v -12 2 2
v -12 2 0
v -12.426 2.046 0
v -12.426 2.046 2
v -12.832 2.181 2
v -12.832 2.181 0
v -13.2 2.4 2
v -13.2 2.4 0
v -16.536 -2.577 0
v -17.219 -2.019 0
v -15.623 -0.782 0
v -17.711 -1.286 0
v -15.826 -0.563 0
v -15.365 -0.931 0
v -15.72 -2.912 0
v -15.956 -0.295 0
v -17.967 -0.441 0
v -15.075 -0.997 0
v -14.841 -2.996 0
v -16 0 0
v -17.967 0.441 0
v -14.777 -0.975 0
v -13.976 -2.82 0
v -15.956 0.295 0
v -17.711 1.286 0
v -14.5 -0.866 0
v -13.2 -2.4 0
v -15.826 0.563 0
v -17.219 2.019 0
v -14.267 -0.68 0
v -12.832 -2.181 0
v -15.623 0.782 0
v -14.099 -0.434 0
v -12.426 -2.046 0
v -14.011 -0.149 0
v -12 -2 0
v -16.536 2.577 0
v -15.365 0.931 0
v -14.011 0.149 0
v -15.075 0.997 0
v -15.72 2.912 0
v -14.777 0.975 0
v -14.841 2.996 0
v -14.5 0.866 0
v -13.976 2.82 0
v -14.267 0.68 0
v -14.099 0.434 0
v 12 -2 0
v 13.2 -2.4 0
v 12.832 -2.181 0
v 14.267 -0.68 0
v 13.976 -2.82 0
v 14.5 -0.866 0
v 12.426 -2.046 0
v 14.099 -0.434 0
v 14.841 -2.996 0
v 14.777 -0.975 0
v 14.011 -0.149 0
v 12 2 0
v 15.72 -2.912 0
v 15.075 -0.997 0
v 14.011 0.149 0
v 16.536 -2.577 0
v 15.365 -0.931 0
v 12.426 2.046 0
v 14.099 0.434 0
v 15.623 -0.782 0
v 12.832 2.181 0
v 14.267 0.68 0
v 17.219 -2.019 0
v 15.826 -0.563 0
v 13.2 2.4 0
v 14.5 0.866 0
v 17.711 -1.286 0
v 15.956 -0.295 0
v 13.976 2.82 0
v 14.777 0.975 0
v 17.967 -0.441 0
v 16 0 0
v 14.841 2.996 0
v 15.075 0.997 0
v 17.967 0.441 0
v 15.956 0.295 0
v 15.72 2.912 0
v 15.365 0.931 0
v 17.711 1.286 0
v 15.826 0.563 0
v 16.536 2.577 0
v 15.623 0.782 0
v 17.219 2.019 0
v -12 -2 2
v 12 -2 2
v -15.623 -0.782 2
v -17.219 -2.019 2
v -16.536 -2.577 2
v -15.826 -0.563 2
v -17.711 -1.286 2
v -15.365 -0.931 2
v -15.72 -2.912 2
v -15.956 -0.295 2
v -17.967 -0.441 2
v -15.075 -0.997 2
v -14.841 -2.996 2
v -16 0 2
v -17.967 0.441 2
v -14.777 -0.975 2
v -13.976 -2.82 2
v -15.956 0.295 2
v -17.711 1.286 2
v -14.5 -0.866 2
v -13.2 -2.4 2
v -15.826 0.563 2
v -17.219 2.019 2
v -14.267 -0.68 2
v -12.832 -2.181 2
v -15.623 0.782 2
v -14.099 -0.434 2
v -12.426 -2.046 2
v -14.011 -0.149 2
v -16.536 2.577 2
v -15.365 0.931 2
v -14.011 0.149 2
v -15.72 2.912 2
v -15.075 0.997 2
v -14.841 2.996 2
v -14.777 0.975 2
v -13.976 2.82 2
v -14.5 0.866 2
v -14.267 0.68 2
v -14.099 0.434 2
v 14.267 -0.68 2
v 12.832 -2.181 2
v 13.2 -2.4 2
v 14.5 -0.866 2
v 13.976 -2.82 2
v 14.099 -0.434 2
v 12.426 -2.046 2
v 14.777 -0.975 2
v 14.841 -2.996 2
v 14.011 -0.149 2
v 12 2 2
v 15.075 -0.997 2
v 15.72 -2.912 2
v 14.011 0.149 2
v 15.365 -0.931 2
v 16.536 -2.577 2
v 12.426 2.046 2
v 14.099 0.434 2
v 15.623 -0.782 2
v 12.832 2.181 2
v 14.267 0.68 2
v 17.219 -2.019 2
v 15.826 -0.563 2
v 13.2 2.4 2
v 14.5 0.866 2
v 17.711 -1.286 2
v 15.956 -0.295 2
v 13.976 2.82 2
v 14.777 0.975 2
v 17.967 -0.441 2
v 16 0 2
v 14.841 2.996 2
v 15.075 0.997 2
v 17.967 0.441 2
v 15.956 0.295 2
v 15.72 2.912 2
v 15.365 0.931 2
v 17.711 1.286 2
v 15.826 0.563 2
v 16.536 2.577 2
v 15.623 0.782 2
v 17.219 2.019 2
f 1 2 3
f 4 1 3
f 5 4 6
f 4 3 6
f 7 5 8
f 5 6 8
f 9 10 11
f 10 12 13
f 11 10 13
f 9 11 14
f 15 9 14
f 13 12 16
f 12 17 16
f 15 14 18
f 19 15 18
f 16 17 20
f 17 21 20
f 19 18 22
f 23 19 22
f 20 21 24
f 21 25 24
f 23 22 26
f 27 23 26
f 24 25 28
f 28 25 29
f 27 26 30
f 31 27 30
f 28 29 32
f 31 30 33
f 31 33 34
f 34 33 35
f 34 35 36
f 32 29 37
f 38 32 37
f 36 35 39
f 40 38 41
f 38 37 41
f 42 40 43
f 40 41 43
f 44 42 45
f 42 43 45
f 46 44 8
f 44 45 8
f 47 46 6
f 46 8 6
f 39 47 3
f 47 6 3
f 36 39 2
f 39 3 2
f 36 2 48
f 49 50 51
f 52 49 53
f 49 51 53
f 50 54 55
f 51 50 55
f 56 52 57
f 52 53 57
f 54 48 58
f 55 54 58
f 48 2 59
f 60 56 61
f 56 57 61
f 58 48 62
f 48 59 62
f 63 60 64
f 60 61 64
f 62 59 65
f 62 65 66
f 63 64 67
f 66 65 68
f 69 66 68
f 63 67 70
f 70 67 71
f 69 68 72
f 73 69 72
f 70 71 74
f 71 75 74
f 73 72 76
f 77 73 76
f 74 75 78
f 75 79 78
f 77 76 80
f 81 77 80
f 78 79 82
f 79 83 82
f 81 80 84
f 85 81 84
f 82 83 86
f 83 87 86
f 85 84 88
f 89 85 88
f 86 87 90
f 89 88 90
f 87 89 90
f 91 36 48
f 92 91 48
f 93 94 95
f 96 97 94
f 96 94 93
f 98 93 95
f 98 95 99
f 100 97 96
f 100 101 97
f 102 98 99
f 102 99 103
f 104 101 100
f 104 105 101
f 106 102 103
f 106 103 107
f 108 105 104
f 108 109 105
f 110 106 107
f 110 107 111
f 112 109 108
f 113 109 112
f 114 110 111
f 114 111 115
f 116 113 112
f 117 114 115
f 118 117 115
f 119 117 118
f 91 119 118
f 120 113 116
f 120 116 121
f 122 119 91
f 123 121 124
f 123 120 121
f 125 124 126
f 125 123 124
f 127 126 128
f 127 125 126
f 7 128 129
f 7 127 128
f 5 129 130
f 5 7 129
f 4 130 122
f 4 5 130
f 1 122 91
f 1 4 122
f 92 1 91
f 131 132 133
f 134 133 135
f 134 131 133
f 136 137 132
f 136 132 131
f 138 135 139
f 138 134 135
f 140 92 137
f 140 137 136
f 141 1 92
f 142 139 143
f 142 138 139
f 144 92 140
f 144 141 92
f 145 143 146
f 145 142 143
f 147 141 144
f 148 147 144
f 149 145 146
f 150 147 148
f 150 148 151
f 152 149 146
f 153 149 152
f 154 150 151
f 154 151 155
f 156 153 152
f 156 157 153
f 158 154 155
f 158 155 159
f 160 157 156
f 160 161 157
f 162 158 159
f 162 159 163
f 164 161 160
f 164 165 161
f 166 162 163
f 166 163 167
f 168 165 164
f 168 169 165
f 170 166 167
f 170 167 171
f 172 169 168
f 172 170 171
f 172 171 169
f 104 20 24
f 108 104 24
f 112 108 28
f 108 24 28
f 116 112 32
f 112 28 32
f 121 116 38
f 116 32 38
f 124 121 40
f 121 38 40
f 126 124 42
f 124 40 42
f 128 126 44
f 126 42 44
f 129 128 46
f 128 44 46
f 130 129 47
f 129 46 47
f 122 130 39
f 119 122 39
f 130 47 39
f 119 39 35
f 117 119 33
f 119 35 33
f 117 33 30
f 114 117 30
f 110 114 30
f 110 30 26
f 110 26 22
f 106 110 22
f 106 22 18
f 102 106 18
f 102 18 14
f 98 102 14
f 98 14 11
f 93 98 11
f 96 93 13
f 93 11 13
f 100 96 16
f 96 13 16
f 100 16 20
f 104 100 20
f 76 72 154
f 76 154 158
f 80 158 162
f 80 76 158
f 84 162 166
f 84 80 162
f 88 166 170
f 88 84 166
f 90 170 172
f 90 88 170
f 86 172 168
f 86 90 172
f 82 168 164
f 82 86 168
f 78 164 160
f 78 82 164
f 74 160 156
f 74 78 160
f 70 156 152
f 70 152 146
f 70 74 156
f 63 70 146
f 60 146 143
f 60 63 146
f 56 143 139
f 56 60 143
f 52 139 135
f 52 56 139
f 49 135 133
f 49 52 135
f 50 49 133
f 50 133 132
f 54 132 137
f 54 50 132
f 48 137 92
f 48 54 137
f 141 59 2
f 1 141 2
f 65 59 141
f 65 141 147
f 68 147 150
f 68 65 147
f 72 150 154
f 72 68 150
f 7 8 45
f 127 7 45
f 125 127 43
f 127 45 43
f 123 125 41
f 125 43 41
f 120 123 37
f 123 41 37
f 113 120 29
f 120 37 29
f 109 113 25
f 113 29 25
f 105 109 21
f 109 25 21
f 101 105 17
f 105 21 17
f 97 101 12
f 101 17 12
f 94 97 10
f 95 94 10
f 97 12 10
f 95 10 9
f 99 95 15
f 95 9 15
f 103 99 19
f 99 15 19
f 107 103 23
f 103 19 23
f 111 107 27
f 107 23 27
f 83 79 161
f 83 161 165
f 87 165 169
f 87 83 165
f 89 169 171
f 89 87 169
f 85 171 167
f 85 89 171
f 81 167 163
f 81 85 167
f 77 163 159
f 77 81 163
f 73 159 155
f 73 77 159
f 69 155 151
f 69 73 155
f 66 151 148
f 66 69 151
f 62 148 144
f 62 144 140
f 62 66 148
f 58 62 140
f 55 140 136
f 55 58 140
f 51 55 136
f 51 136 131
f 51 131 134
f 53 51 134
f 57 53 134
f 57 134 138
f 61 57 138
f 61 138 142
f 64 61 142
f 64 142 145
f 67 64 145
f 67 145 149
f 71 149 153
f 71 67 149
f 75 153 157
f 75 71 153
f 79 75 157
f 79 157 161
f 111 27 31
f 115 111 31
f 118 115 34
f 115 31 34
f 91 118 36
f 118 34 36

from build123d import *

# Parameters (mm, degrees)
SKETCH1_R           = 1
BOSS_EXTRUDE1_DEPTH = 2


with BuildPart() as part:
    # Sketch1 → Boss-Extrude1 (new body)
    with BuildSketch(Plane.XY):
        with BuildLine():
            Line((0, -2), (0, 2))
            Line((0, 2), (12, 2))
            ThreePointArc((12, 2), (12.632455532, 2.102633404), (13.2, 2.4))
            ThreePointArc((13.2, 2.4), (18, 0), (13.2, -2.4))
            ThreePointArc((13.2, -2.4), (12.632455532, -2.102633404), (12, -2))
            Line((12, -2), (0, -2))
        make_face()
        with Locations((15, 0)):
            Circle(SKETCH1_R, mode=Mode.SUBTRACT)
    boss_extrude1 = extrude(amount=BOSS_EXTRUDE1_DEPTH)

    # Mirror1: Boss-Extrude1 across plane
    add(boss_extrude1.mirror(Plane(origin=(0, -2, 2), x_dir=(0, 0, 1), z_dir=(-1, 0, 0))))


solid = part.part
